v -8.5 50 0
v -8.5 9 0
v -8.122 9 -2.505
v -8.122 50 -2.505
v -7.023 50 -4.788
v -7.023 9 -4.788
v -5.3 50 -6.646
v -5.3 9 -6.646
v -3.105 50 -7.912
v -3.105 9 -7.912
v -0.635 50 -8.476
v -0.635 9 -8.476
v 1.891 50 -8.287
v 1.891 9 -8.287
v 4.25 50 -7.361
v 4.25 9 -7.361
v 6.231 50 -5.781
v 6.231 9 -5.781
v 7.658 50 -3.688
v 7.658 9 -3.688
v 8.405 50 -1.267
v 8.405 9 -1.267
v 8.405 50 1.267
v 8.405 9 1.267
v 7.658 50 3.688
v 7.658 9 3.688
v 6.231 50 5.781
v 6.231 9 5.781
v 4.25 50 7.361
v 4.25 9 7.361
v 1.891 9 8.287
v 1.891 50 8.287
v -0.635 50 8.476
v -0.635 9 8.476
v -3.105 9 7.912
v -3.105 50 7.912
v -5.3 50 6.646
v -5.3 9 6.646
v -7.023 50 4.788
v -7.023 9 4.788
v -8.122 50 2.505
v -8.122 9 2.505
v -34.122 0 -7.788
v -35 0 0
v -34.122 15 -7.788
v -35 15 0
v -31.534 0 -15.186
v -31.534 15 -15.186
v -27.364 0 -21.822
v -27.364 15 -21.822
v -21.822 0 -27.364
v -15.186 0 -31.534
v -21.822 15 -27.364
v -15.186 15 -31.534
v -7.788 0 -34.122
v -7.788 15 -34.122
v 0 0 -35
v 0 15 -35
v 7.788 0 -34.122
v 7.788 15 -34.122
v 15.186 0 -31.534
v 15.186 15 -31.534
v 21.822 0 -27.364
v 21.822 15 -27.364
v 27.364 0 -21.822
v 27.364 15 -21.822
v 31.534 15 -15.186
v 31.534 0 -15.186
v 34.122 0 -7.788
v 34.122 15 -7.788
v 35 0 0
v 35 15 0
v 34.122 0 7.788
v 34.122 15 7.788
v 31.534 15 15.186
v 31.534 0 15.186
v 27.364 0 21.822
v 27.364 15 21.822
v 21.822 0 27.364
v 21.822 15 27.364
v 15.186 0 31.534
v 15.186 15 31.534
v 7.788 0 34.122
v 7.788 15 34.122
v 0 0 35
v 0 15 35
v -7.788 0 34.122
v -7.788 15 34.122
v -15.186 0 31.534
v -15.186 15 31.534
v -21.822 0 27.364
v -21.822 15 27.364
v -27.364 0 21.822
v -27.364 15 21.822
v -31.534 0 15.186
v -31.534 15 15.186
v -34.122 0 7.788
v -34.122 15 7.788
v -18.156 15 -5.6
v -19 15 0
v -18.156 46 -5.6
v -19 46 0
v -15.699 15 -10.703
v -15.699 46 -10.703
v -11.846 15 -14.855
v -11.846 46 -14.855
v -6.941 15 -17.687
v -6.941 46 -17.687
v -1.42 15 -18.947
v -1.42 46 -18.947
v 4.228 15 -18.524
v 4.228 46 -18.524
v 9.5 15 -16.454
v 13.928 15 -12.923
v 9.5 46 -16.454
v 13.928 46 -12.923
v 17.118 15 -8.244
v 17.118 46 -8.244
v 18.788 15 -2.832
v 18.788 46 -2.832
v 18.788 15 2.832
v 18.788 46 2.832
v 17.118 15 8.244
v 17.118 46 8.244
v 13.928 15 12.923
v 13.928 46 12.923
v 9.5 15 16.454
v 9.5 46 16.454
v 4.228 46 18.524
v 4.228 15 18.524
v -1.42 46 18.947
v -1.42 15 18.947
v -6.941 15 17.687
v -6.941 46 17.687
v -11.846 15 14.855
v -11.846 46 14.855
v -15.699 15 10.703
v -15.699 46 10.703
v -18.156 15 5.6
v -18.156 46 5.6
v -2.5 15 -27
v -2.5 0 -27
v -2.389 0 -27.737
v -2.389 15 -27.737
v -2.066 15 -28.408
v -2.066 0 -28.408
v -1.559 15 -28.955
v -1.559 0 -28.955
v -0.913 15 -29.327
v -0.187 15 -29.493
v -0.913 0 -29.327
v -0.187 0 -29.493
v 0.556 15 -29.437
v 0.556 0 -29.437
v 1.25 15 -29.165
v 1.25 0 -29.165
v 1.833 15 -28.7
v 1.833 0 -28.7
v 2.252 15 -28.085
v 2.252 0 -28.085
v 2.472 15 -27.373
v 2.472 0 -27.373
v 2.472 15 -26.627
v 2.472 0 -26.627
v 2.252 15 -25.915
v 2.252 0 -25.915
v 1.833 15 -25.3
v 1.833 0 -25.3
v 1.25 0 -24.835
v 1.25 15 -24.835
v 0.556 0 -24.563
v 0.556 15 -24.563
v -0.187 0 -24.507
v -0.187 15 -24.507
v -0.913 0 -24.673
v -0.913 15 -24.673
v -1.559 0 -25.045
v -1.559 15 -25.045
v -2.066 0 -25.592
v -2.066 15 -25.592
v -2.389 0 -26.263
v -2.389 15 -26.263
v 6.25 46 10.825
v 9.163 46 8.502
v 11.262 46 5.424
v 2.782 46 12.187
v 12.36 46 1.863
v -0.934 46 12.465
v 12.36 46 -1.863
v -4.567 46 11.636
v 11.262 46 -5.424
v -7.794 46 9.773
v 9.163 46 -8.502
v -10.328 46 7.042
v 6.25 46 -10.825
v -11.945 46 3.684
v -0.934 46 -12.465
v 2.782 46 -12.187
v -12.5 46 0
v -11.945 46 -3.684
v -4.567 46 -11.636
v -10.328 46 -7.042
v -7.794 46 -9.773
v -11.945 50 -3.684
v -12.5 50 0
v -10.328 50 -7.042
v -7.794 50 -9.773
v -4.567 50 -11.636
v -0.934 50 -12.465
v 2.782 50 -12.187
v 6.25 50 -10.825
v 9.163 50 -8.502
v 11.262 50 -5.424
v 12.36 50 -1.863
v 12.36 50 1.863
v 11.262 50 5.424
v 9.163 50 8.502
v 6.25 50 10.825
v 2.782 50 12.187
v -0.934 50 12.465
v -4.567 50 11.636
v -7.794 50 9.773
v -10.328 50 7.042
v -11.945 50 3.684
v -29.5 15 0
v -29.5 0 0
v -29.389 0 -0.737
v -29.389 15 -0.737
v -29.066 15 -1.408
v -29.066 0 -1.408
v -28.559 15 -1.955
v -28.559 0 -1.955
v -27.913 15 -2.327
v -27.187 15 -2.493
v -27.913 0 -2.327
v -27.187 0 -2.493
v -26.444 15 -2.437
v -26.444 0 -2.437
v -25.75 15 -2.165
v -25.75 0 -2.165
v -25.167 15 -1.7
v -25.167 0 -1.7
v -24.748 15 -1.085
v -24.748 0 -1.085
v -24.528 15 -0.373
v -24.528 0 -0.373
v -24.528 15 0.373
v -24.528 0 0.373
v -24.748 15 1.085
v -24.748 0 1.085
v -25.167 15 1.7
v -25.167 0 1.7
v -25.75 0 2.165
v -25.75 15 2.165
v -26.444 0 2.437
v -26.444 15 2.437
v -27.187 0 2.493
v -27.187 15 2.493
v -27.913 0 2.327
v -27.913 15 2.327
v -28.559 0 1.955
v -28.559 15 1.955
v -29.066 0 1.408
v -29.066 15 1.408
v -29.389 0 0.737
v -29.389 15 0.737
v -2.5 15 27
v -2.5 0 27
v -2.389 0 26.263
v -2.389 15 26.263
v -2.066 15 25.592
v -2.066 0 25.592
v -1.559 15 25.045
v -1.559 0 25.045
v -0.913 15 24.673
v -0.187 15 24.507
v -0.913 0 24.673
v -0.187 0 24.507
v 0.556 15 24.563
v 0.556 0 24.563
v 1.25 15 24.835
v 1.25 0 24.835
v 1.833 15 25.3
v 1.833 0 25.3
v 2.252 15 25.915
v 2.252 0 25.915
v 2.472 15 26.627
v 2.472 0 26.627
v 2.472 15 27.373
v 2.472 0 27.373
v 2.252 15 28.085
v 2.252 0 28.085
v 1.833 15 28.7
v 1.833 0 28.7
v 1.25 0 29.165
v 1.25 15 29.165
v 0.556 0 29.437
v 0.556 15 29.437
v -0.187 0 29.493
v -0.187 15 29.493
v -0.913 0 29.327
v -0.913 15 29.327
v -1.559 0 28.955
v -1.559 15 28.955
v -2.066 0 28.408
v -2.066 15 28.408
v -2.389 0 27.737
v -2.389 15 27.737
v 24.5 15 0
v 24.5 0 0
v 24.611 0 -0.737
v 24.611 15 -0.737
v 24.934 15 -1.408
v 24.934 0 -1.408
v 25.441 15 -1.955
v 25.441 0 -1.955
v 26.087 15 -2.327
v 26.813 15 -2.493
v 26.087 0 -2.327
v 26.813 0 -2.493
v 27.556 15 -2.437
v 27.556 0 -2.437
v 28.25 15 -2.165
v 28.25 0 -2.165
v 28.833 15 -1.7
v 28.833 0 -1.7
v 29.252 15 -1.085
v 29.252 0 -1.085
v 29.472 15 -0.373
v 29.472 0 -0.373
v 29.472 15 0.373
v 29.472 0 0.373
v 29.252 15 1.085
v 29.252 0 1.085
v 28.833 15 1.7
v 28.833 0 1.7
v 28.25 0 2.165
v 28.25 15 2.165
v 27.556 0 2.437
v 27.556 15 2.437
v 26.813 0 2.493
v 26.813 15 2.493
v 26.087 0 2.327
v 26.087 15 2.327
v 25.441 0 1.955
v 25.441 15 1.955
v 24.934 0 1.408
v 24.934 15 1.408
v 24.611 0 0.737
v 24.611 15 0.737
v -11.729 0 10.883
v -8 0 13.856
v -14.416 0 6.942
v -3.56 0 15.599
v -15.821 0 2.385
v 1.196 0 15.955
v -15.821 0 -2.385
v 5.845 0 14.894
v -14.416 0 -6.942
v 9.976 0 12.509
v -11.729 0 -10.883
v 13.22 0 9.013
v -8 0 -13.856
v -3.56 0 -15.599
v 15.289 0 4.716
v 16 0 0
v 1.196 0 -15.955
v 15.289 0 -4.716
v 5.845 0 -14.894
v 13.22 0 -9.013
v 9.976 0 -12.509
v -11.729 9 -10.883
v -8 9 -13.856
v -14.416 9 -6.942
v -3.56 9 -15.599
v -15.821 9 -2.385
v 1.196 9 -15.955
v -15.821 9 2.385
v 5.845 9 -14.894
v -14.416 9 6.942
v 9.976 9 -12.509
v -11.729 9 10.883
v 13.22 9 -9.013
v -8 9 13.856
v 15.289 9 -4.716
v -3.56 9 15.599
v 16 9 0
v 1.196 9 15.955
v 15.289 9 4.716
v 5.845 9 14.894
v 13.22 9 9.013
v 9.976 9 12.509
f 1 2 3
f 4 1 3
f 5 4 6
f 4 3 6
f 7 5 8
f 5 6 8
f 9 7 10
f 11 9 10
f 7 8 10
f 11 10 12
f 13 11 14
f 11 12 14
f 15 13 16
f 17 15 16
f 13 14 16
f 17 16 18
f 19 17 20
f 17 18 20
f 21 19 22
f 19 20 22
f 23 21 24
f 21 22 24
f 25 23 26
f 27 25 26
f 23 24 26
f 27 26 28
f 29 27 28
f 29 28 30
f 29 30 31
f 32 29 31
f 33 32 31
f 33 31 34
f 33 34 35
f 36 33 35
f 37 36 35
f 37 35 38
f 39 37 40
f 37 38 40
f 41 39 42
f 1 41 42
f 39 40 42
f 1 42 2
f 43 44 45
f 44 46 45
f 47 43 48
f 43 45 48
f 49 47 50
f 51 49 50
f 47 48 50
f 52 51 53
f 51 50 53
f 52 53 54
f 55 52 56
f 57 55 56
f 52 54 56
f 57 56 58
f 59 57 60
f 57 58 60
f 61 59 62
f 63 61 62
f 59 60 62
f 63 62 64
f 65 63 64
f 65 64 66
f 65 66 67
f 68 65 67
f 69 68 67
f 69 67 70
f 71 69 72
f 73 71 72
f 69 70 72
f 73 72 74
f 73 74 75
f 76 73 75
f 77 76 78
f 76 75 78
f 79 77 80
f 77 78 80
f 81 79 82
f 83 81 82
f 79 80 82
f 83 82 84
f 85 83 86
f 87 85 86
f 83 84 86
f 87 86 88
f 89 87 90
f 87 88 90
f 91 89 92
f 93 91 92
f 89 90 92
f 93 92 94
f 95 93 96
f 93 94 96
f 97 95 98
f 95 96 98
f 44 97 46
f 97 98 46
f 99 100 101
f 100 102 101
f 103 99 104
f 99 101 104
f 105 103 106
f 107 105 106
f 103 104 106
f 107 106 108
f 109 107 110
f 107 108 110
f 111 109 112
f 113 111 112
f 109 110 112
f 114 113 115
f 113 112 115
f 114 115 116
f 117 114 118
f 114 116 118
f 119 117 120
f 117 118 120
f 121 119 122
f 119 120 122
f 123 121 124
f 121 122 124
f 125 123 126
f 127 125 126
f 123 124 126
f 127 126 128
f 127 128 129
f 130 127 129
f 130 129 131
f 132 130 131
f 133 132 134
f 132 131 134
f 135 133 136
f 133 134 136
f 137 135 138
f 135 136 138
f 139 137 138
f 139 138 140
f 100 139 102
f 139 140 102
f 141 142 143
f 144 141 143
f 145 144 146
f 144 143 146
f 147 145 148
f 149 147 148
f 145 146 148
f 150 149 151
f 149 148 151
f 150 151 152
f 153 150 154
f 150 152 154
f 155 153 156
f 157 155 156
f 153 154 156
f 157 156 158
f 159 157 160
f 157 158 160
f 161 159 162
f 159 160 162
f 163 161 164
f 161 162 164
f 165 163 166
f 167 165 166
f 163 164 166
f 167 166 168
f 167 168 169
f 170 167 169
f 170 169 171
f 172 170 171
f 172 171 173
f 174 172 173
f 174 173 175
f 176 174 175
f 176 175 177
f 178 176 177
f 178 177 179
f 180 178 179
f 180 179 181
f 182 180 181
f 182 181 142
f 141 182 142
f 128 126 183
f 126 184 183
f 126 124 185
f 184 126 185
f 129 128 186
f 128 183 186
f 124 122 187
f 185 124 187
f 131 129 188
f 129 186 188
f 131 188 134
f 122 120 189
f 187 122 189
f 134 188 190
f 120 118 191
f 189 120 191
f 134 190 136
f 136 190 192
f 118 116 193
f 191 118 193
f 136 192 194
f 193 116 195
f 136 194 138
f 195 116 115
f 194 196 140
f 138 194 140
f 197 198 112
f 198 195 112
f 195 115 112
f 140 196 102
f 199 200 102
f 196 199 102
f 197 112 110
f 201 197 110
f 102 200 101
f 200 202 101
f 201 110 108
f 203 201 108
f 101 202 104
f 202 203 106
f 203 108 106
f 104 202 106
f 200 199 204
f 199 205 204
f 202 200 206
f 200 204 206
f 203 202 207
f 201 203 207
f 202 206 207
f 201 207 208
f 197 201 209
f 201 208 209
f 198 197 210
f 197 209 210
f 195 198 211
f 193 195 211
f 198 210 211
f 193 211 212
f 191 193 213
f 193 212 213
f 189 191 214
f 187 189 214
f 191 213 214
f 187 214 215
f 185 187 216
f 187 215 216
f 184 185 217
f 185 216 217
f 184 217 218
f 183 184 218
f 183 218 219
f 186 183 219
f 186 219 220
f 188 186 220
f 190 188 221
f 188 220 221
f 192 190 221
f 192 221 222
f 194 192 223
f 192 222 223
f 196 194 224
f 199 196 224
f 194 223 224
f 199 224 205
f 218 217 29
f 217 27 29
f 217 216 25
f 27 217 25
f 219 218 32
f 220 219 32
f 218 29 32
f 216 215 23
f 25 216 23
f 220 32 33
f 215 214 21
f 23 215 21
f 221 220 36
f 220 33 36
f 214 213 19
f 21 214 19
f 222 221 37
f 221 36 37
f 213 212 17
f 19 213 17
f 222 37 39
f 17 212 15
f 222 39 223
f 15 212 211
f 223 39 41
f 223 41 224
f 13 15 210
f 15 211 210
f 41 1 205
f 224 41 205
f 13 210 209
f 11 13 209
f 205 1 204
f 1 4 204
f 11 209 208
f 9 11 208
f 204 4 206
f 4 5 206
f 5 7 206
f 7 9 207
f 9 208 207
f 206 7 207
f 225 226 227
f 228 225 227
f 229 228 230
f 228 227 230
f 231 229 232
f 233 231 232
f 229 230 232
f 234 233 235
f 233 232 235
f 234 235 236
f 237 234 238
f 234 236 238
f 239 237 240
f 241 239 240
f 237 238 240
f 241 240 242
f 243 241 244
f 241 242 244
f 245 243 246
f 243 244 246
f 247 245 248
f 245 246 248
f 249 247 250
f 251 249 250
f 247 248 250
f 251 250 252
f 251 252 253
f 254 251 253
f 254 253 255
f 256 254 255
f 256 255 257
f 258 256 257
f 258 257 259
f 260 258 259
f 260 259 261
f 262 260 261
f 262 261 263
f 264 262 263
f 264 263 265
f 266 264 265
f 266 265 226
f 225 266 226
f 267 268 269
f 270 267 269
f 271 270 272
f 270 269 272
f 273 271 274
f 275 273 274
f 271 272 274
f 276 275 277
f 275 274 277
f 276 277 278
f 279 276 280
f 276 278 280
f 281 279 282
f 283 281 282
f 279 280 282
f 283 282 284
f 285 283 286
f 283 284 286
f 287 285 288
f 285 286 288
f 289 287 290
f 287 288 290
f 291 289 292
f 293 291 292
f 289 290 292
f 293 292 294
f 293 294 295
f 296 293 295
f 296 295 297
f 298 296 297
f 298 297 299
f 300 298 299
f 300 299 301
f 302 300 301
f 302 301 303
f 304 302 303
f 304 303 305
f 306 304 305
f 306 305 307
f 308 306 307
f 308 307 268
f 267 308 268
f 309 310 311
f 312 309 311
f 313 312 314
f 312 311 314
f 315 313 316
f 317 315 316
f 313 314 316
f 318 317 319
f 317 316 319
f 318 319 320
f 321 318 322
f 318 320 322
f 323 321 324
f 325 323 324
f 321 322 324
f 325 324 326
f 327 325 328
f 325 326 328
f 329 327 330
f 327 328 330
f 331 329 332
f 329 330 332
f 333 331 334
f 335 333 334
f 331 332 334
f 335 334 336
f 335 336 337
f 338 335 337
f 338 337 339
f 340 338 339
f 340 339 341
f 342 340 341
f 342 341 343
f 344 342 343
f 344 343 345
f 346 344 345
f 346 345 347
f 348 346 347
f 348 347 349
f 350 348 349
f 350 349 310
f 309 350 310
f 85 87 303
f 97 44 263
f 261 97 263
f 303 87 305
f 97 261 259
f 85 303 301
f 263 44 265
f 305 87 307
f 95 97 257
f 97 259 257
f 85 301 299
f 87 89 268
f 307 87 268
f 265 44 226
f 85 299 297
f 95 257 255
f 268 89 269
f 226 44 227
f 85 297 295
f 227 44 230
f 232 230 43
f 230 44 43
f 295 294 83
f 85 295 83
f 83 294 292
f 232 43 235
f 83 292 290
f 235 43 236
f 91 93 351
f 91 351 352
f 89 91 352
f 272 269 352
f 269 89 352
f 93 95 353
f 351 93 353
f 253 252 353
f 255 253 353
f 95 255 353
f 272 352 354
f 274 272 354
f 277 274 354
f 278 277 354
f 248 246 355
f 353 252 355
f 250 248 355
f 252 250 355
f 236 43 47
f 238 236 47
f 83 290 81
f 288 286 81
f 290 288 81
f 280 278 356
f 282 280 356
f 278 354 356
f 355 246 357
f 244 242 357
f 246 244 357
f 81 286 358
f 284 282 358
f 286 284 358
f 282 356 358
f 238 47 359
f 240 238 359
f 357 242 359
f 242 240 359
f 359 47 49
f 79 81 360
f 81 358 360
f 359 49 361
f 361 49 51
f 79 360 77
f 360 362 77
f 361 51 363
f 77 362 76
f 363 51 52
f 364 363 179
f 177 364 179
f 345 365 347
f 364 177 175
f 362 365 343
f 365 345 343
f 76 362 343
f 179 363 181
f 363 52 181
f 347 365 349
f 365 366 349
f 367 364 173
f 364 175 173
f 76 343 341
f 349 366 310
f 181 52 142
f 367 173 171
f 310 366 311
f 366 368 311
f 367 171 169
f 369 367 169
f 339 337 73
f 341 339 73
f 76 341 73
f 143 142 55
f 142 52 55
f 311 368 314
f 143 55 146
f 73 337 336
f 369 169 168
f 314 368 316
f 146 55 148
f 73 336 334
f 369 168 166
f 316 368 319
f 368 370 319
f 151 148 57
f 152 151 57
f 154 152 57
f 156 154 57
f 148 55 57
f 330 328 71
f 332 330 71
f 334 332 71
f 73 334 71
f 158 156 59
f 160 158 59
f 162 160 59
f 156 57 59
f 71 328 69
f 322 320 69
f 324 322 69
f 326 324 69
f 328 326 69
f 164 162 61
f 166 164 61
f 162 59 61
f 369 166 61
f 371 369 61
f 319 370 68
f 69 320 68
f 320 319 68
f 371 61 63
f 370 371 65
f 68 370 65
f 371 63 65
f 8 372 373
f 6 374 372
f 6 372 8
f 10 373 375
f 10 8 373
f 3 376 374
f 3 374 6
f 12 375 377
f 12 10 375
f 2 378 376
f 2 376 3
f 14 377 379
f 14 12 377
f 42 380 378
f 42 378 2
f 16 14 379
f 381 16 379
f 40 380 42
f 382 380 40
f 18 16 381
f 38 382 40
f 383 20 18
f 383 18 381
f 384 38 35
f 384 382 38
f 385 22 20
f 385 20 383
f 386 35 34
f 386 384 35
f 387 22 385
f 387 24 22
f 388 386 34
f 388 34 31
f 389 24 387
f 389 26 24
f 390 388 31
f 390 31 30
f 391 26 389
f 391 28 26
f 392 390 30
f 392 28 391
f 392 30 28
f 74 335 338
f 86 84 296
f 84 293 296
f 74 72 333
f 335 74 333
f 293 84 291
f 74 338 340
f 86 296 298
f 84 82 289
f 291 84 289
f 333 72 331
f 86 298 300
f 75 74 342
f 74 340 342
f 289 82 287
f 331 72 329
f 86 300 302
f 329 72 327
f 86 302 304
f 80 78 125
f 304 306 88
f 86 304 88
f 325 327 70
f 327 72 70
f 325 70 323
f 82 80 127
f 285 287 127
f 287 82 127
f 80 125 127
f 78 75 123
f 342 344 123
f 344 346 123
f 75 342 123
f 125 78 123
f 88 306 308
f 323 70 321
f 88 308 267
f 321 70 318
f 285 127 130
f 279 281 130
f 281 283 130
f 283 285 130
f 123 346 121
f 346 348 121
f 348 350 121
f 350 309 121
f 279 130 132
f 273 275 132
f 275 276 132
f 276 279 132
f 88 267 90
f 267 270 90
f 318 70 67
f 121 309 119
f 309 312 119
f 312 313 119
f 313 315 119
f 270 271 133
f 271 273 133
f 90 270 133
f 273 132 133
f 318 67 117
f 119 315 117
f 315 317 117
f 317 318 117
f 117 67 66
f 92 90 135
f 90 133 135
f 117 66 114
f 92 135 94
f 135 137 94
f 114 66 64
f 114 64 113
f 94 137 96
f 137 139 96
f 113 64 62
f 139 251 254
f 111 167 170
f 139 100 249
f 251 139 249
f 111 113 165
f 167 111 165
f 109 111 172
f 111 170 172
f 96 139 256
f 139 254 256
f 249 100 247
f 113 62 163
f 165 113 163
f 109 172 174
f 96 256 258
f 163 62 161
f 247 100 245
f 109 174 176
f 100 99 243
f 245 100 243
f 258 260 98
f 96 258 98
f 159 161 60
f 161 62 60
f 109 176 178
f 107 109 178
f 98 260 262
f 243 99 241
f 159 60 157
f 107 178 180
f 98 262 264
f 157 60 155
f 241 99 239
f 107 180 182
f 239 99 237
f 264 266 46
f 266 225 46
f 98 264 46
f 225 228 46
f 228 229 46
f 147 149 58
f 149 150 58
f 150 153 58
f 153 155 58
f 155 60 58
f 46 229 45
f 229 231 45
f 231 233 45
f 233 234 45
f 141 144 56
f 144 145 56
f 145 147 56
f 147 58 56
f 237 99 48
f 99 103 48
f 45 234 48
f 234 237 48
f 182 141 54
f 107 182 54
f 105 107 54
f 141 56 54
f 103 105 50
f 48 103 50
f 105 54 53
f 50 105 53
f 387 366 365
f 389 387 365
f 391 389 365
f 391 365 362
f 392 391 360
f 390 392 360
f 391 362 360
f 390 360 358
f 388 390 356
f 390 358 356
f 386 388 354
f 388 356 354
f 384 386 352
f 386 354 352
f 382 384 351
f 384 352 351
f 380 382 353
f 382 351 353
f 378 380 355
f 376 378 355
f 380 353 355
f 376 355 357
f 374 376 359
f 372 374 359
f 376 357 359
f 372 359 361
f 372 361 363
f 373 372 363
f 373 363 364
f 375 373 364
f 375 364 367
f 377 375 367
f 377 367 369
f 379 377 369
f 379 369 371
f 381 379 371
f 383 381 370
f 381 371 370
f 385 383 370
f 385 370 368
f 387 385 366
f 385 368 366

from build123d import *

# Parameters (mm, degrees)
M6_TAPPED_HOLE1_D  = 5
SKETCH4_R          = 16
CUT_EXTRUDE1_DEPTH = 9


with BuildPart() as part:
    # Sketch1 → Revolve1 (revolve)
    with BuildSketch(Plane.XY):
        Polygon((-8.5, 0), (-35, 0), (-35, 15), (-19, 15), (-19, 46), (-12.5, 46), (-12.5, 50), (-8.5, 50), align=None)
    revolve(axis=Axis((0, 0, 0), (0, -1, 0)))

    # M6 Tapped Hole1 (through all)
    with Locations(Plane(origin=(0, 15, 0), x_dir=(1, 0, 0), z_dir=(0, 1, 0))):
        with Locations((-27, 0), (0, 27), (27, 0), (0, -27)):
            Hole(M6_TAPPED_HOLE1_D / 2)

    # Sketch4 → Cut-Extrude1 (cut)
    with BuildSketch(Plane.XZ):
        Circle(SKETCH4_R)
    extrude(amount=-CUT_EXTRUDE1_DEPTH, mode=Mode.SUBTRACT)


solid = part.part
